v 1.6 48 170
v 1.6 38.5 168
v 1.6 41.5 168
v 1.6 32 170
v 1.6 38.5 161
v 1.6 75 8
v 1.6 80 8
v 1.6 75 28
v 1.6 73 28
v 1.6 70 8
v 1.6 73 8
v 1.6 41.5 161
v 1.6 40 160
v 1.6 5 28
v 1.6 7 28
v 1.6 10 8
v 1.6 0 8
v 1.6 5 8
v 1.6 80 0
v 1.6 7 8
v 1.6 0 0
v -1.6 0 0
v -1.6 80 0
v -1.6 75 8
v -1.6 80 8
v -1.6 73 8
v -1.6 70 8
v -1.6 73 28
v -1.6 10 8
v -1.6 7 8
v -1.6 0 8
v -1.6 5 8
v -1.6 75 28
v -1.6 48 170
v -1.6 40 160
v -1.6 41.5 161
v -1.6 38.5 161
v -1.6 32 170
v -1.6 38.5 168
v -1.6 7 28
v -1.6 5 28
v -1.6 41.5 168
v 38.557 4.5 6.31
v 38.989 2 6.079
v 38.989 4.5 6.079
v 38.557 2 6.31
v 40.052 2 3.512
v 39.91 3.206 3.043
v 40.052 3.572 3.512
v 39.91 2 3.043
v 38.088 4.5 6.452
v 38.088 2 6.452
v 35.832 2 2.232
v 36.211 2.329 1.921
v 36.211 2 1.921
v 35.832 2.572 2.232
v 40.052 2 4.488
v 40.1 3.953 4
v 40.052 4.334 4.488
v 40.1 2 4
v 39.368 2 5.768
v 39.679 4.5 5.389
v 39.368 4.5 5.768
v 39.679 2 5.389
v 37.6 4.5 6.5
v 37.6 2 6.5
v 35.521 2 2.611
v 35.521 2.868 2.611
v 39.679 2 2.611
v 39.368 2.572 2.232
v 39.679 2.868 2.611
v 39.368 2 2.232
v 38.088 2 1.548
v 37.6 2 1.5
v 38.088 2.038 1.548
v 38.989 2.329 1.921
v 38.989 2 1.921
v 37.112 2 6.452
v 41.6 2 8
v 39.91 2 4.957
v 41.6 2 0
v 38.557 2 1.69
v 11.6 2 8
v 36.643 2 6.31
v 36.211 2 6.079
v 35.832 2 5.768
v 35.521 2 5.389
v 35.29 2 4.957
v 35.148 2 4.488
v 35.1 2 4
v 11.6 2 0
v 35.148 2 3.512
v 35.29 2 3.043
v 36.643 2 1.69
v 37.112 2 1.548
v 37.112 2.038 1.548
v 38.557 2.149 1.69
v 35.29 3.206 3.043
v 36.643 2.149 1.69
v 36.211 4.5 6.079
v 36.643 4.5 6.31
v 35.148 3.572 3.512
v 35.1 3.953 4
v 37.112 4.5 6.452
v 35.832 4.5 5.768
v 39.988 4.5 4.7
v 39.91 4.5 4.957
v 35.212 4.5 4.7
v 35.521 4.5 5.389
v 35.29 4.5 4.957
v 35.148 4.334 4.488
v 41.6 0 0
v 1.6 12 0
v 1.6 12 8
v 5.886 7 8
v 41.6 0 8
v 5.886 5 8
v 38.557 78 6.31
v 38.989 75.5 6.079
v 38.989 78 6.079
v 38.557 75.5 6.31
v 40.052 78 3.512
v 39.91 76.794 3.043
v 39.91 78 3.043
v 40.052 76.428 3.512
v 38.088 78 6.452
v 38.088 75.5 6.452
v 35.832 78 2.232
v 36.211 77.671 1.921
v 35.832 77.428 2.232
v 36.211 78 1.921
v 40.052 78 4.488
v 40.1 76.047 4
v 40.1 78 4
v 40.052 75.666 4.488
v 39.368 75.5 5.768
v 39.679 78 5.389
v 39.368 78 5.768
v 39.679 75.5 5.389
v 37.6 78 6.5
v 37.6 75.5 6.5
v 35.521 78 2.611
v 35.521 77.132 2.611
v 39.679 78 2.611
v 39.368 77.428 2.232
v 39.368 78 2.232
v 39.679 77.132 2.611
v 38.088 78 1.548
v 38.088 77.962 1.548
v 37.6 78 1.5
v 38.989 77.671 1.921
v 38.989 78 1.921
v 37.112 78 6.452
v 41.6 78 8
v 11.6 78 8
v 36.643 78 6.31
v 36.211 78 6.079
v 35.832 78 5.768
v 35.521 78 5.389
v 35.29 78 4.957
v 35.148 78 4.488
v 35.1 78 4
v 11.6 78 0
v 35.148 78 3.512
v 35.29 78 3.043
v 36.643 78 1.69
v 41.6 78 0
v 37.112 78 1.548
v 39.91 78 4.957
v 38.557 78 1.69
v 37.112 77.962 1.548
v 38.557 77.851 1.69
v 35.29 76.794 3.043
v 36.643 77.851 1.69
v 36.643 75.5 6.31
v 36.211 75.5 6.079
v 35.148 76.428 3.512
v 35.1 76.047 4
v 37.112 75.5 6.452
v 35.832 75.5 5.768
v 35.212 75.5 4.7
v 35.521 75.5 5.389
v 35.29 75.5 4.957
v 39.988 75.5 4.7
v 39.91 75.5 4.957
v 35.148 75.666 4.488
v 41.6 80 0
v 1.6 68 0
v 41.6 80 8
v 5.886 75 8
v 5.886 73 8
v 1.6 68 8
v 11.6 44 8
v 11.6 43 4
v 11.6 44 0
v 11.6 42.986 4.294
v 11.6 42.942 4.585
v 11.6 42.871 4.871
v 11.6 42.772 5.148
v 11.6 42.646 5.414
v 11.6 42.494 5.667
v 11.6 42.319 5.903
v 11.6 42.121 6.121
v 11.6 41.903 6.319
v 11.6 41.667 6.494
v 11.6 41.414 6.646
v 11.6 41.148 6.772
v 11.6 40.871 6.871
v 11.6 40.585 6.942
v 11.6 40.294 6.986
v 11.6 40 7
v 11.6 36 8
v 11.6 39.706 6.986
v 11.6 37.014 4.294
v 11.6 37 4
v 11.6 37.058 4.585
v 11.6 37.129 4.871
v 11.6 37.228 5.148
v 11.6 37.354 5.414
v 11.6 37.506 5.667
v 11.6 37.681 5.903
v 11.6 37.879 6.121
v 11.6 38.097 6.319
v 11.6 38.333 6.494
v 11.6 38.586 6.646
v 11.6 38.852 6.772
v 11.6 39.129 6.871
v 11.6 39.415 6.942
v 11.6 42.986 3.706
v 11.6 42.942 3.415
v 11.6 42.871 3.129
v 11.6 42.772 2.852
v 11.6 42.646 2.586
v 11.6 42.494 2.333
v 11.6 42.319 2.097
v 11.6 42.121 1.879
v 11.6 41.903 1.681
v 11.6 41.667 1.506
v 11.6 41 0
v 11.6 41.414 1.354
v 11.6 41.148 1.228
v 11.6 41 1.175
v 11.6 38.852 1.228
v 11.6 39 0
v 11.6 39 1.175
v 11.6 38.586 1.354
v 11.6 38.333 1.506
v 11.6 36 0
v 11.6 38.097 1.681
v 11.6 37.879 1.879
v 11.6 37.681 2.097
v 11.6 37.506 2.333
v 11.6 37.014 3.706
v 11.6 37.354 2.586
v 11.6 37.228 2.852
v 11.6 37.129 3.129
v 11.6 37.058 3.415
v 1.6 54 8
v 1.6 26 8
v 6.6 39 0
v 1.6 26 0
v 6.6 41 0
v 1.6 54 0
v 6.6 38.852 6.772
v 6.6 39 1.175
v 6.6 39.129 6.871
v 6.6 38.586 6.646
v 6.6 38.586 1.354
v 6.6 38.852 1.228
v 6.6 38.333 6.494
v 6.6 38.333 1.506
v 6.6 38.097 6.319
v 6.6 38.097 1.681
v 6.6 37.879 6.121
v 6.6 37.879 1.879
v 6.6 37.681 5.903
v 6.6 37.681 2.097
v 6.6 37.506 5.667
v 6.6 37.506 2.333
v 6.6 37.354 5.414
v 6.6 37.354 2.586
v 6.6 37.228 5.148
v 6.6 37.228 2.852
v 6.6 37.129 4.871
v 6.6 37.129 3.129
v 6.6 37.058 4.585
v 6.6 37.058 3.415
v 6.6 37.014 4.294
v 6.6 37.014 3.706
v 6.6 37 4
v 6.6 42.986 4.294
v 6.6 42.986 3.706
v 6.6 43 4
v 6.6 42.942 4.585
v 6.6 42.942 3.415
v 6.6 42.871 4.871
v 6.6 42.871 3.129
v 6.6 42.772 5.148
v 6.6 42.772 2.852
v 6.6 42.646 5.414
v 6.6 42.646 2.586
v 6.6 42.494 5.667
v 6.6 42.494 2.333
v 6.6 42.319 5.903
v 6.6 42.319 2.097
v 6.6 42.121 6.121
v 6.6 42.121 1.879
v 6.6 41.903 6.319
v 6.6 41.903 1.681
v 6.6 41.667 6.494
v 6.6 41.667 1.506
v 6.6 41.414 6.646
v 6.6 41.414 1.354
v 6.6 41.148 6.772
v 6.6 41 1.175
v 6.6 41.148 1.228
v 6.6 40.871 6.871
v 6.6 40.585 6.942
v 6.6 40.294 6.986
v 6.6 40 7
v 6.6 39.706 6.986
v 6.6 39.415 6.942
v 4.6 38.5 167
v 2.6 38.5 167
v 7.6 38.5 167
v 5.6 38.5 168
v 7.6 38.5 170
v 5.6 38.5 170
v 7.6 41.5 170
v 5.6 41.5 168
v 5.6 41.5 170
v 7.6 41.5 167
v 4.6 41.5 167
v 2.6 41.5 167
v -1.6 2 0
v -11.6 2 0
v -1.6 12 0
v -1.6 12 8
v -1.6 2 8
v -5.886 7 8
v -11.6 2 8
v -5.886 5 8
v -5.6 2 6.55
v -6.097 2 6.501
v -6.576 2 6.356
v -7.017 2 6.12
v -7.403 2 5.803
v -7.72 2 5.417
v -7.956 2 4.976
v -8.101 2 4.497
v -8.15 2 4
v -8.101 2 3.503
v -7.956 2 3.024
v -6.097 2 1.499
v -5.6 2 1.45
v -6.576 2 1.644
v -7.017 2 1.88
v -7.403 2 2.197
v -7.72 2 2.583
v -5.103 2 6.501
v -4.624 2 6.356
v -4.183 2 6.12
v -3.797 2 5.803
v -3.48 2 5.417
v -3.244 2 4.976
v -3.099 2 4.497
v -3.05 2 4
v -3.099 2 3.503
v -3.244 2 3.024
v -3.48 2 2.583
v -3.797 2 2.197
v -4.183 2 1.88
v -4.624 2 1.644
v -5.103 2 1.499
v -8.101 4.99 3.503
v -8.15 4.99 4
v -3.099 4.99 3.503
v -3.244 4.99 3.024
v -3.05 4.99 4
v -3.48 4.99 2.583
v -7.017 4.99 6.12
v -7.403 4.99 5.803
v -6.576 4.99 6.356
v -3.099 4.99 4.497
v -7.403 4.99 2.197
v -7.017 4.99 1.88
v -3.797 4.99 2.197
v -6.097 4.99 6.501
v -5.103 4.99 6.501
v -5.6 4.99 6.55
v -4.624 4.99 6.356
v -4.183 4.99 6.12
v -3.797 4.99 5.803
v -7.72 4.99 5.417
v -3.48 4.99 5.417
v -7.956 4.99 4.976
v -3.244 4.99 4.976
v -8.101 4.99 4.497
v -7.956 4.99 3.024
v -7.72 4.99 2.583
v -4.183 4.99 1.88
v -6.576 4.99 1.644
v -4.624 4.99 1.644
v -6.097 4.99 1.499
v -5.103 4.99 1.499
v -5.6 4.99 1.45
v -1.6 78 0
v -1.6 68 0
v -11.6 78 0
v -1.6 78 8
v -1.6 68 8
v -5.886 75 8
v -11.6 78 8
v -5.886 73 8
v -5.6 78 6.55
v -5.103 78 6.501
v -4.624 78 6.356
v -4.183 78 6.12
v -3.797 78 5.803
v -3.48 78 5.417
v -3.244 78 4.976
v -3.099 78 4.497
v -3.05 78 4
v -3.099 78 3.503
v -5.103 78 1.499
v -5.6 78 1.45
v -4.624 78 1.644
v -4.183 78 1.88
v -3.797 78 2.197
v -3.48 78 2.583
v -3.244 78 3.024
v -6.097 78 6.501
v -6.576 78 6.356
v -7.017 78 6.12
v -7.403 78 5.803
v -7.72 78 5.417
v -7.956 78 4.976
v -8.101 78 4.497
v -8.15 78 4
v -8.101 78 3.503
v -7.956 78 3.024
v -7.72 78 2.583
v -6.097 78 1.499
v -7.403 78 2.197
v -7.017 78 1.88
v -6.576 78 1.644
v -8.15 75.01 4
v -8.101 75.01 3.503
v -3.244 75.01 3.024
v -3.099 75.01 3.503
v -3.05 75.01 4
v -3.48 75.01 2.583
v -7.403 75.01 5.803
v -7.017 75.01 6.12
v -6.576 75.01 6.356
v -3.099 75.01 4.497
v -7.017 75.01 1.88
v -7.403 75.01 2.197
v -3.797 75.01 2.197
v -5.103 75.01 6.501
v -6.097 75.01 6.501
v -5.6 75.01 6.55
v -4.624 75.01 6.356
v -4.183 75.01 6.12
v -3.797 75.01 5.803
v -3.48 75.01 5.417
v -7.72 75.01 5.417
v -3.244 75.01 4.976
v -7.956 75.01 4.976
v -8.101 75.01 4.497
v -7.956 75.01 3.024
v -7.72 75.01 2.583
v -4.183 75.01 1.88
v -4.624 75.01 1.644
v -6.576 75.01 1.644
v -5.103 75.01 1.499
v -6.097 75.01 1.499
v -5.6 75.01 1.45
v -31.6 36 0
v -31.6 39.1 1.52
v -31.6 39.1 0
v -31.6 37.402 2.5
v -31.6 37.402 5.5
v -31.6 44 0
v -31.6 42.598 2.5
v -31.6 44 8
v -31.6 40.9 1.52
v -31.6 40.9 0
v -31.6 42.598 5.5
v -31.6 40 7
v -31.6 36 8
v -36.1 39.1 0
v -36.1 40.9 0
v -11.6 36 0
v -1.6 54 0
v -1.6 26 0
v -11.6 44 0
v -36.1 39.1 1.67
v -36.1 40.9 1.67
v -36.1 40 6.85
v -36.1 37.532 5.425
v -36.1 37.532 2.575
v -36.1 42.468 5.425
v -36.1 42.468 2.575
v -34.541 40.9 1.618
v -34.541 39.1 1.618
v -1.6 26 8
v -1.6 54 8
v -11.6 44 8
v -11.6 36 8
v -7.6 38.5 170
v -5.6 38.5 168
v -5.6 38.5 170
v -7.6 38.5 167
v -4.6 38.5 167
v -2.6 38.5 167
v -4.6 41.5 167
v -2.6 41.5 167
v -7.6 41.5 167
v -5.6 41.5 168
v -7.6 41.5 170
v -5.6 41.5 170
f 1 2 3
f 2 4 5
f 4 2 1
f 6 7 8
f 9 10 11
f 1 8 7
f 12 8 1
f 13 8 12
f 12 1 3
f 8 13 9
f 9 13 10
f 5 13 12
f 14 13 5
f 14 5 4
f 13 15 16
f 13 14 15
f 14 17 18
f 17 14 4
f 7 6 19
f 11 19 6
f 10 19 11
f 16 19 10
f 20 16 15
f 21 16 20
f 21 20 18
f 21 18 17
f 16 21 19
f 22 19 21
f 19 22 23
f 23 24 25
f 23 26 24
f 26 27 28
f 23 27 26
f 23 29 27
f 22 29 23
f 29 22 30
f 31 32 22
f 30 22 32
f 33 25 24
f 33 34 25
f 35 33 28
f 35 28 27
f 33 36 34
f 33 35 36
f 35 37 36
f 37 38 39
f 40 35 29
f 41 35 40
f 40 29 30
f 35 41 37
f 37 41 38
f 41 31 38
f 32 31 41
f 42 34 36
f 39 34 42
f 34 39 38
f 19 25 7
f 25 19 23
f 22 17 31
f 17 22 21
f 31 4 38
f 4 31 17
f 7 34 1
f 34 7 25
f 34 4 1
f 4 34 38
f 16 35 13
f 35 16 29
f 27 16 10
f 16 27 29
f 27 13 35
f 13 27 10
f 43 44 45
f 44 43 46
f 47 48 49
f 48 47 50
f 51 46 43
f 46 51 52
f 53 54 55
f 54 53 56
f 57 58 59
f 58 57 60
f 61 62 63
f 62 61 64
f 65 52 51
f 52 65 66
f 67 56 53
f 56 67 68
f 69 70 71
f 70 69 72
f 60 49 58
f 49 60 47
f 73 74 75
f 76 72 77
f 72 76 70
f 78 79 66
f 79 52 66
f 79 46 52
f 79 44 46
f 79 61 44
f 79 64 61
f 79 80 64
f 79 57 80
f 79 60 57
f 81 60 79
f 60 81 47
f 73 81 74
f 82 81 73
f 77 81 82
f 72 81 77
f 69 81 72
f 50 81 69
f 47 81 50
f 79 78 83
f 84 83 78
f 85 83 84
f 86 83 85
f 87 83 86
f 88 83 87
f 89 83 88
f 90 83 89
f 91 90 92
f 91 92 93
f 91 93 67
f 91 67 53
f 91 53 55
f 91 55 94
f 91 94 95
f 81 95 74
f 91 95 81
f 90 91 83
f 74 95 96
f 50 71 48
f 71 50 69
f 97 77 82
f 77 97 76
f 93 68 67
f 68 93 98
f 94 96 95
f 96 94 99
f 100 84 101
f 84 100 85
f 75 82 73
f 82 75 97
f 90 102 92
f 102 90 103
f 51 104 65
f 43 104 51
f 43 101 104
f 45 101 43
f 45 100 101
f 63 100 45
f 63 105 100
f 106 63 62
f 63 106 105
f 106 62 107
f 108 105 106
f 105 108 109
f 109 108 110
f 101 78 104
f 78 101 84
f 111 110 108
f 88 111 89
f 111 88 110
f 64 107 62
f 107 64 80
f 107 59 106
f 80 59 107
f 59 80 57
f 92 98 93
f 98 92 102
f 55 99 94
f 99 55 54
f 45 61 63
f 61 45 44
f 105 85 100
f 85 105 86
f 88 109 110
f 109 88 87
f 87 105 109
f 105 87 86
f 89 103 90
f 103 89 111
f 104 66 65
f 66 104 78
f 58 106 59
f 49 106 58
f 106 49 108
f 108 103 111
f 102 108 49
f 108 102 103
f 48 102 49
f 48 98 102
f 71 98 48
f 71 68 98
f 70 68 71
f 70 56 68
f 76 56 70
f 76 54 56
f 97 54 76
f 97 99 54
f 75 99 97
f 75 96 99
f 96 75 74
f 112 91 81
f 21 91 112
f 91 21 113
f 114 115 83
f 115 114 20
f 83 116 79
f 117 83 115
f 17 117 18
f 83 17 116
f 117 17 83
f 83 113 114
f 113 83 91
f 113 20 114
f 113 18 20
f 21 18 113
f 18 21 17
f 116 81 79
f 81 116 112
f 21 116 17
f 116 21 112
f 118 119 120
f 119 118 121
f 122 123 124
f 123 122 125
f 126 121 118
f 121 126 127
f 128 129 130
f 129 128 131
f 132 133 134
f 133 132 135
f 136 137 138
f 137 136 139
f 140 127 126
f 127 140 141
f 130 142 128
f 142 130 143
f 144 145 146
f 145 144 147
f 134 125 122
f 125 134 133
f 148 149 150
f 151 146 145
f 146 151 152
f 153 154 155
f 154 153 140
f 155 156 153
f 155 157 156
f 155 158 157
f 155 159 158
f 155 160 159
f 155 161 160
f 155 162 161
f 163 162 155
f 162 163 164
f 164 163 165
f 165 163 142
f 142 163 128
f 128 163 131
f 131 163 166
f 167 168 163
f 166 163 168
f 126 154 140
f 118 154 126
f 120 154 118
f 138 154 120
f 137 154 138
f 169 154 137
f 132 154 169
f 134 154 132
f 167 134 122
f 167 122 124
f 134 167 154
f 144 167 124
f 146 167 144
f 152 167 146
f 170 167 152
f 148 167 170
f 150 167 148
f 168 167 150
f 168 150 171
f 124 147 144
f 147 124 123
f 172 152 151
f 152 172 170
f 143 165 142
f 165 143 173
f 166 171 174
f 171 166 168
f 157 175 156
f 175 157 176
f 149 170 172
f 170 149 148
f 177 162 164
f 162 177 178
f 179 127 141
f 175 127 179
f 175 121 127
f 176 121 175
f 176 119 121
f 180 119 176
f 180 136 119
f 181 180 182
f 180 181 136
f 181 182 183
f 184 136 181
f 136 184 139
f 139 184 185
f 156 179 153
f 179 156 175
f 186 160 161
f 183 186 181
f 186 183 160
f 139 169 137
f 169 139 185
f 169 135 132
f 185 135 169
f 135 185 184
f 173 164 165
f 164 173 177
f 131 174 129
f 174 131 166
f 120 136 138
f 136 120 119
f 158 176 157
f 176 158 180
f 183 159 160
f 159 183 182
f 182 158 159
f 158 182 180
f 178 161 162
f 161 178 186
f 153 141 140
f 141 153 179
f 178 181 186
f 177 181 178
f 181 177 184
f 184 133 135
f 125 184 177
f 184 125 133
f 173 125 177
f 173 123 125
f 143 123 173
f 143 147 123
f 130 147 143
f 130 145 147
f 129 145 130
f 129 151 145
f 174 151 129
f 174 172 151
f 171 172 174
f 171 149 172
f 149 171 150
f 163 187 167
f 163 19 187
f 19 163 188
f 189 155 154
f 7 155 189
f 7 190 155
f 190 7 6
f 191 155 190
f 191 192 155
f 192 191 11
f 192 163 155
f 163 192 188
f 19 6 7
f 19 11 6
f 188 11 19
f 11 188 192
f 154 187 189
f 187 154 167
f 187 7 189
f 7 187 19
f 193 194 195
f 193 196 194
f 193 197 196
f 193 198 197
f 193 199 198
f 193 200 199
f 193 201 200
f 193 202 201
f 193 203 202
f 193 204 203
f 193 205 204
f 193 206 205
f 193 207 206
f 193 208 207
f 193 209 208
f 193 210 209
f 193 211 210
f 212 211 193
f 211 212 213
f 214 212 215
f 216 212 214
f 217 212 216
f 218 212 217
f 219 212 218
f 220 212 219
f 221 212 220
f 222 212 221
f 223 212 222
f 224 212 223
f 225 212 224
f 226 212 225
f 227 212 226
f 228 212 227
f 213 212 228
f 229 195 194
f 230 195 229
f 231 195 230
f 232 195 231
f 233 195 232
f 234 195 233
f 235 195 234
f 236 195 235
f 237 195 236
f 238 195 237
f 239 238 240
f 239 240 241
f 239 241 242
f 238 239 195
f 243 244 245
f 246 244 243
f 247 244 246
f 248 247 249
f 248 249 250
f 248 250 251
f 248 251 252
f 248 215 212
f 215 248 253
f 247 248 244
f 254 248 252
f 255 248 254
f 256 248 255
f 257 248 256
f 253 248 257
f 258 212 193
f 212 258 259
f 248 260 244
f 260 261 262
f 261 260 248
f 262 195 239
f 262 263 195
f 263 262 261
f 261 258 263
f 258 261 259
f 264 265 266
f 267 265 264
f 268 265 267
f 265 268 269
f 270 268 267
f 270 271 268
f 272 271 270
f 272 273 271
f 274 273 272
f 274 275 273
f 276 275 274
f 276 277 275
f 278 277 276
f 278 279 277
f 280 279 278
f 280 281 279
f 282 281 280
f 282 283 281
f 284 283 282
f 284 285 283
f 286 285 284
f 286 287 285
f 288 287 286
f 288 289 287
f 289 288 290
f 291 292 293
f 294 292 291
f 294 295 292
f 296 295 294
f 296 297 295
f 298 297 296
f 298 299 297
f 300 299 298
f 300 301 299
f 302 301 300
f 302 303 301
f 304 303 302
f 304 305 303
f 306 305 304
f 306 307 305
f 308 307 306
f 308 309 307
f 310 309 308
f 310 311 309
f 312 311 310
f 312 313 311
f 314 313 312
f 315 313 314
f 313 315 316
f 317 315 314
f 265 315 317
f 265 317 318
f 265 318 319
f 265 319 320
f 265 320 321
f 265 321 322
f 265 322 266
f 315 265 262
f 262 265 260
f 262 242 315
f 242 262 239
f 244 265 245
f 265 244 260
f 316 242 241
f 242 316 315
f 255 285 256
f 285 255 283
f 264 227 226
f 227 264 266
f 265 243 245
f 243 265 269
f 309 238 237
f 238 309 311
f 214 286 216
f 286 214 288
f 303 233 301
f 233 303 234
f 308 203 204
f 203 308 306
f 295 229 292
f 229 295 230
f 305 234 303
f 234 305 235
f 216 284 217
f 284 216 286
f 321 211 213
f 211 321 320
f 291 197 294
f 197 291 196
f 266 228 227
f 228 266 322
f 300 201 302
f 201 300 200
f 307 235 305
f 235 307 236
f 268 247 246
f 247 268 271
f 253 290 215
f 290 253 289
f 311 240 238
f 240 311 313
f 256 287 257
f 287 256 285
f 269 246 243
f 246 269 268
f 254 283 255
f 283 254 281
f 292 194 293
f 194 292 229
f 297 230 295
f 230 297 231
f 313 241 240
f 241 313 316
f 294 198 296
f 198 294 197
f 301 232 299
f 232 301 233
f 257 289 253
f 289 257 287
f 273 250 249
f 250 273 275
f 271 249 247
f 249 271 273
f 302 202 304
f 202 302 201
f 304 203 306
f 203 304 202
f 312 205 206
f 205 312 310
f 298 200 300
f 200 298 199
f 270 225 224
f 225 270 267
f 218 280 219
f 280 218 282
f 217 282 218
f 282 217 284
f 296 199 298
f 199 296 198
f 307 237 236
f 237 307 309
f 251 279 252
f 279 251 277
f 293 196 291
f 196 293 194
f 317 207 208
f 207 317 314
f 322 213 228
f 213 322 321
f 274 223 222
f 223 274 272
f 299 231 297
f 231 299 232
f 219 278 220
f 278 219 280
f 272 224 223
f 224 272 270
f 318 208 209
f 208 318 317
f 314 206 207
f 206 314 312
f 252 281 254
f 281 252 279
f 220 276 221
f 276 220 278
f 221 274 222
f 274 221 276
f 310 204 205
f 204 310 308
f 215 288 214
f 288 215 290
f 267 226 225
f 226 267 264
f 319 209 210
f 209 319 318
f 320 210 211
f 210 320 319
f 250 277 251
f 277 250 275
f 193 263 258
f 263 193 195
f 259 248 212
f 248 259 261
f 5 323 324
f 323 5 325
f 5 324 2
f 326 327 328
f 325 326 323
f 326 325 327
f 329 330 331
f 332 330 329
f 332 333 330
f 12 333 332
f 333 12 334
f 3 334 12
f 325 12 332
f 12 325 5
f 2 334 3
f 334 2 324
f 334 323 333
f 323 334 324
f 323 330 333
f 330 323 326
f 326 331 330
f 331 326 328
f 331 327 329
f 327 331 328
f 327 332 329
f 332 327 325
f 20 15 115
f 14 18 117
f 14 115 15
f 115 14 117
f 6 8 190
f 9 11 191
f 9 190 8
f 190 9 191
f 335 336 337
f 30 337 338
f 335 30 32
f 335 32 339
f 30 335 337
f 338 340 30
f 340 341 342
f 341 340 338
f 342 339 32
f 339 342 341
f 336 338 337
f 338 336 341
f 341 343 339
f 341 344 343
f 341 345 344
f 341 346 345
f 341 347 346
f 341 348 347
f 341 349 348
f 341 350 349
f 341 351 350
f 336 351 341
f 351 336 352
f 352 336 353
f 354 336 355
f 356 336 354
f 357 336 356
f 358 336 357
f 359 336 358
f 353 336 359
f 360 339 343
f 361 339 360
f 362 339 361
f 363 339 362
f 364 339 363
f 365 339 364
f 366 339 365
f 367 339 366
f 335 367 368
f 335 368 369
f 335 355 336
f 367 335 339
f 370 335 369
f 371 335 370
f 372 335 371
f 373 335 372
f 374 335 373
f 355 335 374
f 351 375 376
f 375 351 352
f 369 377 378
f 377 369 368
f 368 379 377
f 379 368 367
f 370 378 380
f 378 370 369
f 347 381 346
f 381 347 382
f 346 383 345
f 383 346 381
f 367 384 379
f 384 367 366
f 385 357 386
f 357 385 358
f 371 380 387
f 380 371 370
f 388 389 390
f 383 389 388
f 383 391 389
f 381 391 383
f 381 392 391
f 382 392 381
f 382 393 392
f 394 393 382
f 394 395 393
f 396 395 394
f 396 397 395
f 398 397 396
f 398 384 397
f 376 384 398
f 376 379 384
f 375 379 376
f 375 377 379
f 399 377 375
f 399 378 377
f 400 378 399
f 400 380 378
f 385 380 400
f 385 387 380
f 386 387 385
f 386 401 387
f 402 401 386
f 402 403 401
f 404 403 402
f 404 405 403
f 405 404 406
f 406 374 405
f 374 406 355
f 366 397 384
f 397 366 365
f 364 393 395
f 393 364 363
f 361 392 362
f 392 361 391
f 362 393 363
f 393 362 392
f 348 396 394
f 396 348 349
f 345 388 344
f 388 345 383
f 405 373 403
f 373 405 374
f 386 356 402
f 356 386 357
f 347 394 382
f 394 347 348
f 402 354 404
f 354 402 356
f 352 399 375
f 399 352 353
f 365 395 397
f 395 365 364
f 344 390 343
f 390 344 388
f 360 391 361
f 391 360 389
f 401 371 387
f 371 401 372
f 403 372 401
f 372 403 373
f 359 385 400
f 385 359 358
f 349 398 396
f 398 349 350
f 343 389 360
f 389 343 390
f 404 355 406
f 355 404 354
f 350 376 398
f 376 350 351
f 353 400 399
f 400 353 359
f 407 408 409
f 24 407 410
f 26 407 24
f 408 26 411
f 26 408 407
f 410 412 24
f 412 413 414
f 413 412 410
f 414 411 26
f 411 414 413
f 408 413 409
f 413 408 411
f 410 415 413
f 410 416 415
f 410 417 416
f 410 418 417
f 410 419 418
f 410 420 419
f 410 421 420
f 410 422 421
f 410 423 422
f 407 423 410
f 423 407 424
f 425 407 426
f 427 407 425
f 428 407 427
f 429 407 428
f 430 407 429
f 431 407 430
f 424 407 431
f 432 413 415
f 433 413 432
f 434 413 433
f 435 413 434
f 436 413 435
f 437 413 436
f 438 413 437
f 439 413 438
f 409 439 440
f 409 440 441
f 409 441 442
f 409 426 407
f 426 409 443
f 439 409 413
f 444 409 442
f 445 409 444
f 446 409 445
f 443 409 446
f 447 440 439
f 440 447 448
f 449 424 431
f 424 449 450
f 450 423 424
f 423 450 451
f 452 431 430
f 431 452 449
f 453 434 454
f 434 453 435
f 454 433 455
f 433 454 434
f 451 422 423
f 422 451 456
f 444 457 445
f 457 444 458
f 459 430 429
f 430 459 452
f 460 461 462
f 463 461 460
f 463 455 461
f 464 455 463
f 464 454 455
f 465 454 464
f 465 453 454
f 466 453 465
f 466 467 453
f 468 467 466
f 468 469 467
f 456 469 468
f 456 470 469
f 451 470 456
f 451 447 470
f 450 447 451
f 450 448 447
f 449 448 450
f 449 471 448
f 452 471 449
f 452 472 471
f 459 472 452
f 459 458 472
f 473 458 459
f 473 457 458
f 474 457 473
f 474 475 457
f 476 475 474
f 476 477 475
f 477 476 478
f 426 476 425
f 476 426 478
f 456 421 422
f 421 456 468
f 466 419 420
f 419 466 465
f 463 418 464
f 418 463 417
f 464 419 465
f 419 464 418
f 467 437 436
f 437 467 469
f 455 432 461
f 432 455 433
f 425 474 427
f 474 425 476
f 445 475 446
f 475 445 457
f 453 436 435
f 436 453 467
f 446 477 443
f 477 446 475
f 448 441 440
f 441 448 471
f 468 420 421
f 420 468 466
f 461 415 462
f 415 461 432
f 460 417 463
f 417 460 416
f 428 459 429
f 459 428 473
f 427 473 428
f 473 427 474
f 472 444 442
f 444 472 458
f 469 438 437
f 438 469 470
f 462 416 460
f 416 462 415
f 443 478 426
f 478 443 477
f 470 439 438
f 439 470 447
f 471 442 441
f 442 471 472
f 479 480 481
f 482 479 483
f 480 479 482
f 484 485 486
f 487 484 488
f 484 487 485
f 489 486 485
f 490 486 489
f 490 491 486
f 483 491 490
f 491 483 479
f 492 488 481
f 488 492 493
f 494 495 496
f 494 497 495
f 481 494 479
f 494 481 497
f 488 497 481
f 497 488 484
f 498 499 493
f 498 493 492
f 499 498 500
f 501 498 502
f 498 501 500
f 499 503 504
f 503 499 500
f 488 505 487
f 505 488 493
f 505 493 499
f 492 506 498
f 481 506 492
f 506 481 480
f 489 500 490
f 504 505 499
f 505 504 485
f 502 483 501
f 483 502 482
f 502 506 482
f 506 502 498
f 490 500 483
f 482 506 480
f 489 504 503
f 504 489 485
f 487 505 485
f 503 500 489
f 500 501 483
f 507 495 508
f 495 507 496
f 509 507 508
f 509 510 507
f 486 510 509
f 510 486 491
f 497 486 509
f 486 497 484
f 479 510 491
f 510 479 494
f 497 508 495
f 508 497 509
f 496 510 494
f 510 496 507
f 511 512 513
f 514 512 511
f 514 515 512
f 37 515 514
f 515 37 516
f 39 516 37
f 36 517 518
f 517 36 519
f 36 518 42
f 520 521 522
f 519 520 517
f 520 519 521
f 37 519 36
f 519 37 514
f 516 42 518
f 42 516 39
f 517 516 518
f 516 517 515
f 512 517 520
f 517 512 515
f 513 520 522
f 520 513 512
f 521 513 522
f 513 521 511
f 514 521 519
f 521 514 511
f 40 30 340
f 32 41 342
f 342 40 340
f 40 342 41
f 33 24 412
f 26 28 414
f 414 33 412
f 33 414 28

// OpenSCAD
// file: ffp2_drying_rack.scad
/*

  ffp2_drying_rack.scad

  (c) olikraus@gmail.com

  This work is licensed under the Creative Commons Attribution-NonCommercial-ShareAlike 4.0 International License. 
  To view a copy of this license, visit http://creativecommons.org/licenses/by-nc-sa/4.0/.
    
*/


$fn=32;

wall_thickness=3.2;
wall_height=170;
wall_width=80;


clip_len=40;
clip_height=8;
clip_thickness=2;
clip_diameter = clip_height-3;
clip_cylinder_len = 2.5;

/* min 8 for clip_cyllinder_len=2.5 
    also depends on clip_diameter and in turn on clip_height
    clip_triangle_len must be also larger than press_fit_len
*/
clip_triangle_len = 10;

/* clip hole diameter extention, so that the clip fits better */
clip_diameter_gap = 0.1; 


hook_len=6;
hook_nose_height=3;
hook_nose_width=2;
hook_thickness=3;

press_fit_len=5;
press_fit_diameter=clip_height-2;


module triangle_block() {
    linear_extrude(height=clip_height)
    polygon(points=[[0,0],[clip_triangle_len,0],[0,clip_triangle_len]]);
}

module wall_support() {
  translate([0,clip_thickness,0])
  rotate([90,0,0])
  linear_extrude(height=clip_thickness)
  polygon(points=[[0,0],[clip_triangle_len*3/7,0],[0,clip_triangle_len*2]]);
}

module clip_m() {
    union() {
        translate([0,clip_thickness,0])
        triangle_block();
        cube([clip_len, clip_thickness,clip_height]);
        translate([clip_len-(clip_height)/2,clip_thickness,clip_height/2])
        rotate([-90,0,0])
        difference() {
            cylinder(d=clip_diameter, h=clip_cylinder_len);
            translate([0,(clip_diameter)/2,0])
            rotate([-38,0,0])
            translate([-clip_height/2, -clip_height, 0])
            cube([clip_height,clip_height,clip_height]);
        }
    }
}


module clip_f() {
    translate([0,clip_thickness,0])
    difference() {
        rotate([0,0,90])
        triangle_block();
        translate([-clip_height/2,-0.01,clip_height/2])
        rotate([-90,0,0])
        cylinder(d=clip_diameter+clip_diameter_gap, 
                h=clip_cylinder_len+0.5);
    }
}

module hook() {
    rotate([-90,0,0])
    linear_extrude(height=hook_thickness, center=true)
    polygon(points=[
        [0,-1],
        [1,0],
        [hook_len-hook_nose_width-1,0],
        [hook_len-hook_nose_width,-1],
        [hook_len-hook_nose_width,-hook_nose_height],
        [hook_len,-hook_nose_height],
        [hook_len,0],
        [0,hook_len]]);
}

module press_fit_f() {
    difference() {
        translate([0,-clip_height/2,0])
        cube([clip_triangle_len, clip_height, clip_height]);
        
        translate([clip_triangle_len-press_fit_len,
            -press_fit_diameter/3/2,
            -0.01])
        cube([press_fit_len+0.01,press_fit_diameter/3,clip_height/2]);
        

        translate([clip_triangle_len-press_fit_len,0,clip_height/2])
        rotate([0,90,0])
        cylinder(d=press_fit_diameter,h=press_fit_len+0.01, $fn=64);
    }

    translate([0,clip_height/2,0])
    triangle_block();

    mirror([0,1,0])
    translate([0,clip_height/2,0])
    triangle_block();
}

module press_fit_m() {

    translate([-clip_len+clip_triangle_len,0,0])
    union() {
        translate([0.5-press_fit_len,-(press_fit_diameter/3-0.2)/2,0])
        cube([press_fit_len-0.5,press_fit_diameter/3-0.2,clip_height/2]);
        
        translate([0,0,clip_height/2])
        rotate([0,-90,0])
        cylinder(
            d1=press_fit_diameter, 
            d2=press_fit_diameter*0.95, 
            h=press_fit_len-0.5, $fn=6);
        
        translate([0,-clip_height/2,0])
        cube([clip_len-clip_triangle_len, clip_height, clip_height]);
        
        translate([clip_len-clip_triangle_len,clip_height/2,0])
        mirror([1,0,0])
        triangle_block();

        translate([clip_len-clip_triangle_len,-clip_height/2,0])
        rotate([0,0,180])
        triangle_block();
        
    }
}

module pure_wall() {
    difference() {
        union() {
            translate([-wall_thickness/2,0,0])
            cube([wall_thickness, wall_width, clip_height]);

            translate([wall_thickness/2,0,clip_height])
            rotate([0,-90,0])
            linear_extrude(height=wall_thickness)
            polygon(points=[
                [0,0],
                [0,wall_width],
                [wall_height-clip_height,wall_width/2+clip_height],
                [wall_height-clip_height,wall_width/2-clip_height]
            ]);


            
        }

        translate([wall_thickness,0,clip_height])
        rotate([0,-90,0])
        linear_extrude(height=wall_thickness*2)
        polygon(points=[
        [0,clip_triangle_len],
        [0,wall_width-clip_triangle_len],
        [wall_height-clip_height-clip_triangle_len,wall_width/2]
        ]);
    }
    
}


module wall(is_left=1, is_right=1) {
    union() {
        //translate([-wall_thickness/2,0,0])
        //cube([wall_thickness, wall_width, wall_height]);
        pure_wall();
        if ( is_right) {
            translate([wall_thickness/2,0,0])
            clip_m();

            translate([wall_thickness/2,wall_width,0])
            mirror([0,1,0])
            clip_m();

            translate([wall_thickness/2,wall_width/2,0])
            press_fit_f();
            
            translate([wall_thickness/2,
                    wall_width/2,
                    wall_height-hook_nose_height])            
            hook();
	    
            translate([wall_thickness/2,clip_thickness*2.5,clip_height])
	    wall_support();

            translate([wall_thickness/2,wall_width-clip_thickness*3.5,clip_height])
	    wall_support();

        }

        if ( is_left) {

            translate([-wall_thickness/2,0,0])
            clip_f();

            translate([-wall_thickness/2,wall_width,0])
            mirror([0,1,0])
            clip_f();
            
            translate([-wall_thickness/2,wall_width/2,0])
            press_fit_m();
            
            mirror([1,0,0])
            translate([wall_thickness/2,
                    wall_width/2,
                    wall_height-hook_nose_height])
            hook();

            mirror([1,0,0])
            translate([wall_thickness/2,clip_thickness*2.5,clip_height])
	    wall_support();

            mirror([1,0,0])
            translate([wall_thickness/2,wall_width-clip_thickness*3.5,clip_height])
	    wall_support();

        }
    }
}


//wall(1,1);
// main file
/*

  middle.scad

  (c) olikraus@gmail.com

  This work is licensed under the Creative Commons Attribution-NonCommercial-ShareAlike 4.0 International License. 
  To view a copy of this license, visit http://creativecommons.org/licenses/by-nc-sa/4.0/.
    
*/
include <ffp2_drying_rack.scad>

wall(1,1);
